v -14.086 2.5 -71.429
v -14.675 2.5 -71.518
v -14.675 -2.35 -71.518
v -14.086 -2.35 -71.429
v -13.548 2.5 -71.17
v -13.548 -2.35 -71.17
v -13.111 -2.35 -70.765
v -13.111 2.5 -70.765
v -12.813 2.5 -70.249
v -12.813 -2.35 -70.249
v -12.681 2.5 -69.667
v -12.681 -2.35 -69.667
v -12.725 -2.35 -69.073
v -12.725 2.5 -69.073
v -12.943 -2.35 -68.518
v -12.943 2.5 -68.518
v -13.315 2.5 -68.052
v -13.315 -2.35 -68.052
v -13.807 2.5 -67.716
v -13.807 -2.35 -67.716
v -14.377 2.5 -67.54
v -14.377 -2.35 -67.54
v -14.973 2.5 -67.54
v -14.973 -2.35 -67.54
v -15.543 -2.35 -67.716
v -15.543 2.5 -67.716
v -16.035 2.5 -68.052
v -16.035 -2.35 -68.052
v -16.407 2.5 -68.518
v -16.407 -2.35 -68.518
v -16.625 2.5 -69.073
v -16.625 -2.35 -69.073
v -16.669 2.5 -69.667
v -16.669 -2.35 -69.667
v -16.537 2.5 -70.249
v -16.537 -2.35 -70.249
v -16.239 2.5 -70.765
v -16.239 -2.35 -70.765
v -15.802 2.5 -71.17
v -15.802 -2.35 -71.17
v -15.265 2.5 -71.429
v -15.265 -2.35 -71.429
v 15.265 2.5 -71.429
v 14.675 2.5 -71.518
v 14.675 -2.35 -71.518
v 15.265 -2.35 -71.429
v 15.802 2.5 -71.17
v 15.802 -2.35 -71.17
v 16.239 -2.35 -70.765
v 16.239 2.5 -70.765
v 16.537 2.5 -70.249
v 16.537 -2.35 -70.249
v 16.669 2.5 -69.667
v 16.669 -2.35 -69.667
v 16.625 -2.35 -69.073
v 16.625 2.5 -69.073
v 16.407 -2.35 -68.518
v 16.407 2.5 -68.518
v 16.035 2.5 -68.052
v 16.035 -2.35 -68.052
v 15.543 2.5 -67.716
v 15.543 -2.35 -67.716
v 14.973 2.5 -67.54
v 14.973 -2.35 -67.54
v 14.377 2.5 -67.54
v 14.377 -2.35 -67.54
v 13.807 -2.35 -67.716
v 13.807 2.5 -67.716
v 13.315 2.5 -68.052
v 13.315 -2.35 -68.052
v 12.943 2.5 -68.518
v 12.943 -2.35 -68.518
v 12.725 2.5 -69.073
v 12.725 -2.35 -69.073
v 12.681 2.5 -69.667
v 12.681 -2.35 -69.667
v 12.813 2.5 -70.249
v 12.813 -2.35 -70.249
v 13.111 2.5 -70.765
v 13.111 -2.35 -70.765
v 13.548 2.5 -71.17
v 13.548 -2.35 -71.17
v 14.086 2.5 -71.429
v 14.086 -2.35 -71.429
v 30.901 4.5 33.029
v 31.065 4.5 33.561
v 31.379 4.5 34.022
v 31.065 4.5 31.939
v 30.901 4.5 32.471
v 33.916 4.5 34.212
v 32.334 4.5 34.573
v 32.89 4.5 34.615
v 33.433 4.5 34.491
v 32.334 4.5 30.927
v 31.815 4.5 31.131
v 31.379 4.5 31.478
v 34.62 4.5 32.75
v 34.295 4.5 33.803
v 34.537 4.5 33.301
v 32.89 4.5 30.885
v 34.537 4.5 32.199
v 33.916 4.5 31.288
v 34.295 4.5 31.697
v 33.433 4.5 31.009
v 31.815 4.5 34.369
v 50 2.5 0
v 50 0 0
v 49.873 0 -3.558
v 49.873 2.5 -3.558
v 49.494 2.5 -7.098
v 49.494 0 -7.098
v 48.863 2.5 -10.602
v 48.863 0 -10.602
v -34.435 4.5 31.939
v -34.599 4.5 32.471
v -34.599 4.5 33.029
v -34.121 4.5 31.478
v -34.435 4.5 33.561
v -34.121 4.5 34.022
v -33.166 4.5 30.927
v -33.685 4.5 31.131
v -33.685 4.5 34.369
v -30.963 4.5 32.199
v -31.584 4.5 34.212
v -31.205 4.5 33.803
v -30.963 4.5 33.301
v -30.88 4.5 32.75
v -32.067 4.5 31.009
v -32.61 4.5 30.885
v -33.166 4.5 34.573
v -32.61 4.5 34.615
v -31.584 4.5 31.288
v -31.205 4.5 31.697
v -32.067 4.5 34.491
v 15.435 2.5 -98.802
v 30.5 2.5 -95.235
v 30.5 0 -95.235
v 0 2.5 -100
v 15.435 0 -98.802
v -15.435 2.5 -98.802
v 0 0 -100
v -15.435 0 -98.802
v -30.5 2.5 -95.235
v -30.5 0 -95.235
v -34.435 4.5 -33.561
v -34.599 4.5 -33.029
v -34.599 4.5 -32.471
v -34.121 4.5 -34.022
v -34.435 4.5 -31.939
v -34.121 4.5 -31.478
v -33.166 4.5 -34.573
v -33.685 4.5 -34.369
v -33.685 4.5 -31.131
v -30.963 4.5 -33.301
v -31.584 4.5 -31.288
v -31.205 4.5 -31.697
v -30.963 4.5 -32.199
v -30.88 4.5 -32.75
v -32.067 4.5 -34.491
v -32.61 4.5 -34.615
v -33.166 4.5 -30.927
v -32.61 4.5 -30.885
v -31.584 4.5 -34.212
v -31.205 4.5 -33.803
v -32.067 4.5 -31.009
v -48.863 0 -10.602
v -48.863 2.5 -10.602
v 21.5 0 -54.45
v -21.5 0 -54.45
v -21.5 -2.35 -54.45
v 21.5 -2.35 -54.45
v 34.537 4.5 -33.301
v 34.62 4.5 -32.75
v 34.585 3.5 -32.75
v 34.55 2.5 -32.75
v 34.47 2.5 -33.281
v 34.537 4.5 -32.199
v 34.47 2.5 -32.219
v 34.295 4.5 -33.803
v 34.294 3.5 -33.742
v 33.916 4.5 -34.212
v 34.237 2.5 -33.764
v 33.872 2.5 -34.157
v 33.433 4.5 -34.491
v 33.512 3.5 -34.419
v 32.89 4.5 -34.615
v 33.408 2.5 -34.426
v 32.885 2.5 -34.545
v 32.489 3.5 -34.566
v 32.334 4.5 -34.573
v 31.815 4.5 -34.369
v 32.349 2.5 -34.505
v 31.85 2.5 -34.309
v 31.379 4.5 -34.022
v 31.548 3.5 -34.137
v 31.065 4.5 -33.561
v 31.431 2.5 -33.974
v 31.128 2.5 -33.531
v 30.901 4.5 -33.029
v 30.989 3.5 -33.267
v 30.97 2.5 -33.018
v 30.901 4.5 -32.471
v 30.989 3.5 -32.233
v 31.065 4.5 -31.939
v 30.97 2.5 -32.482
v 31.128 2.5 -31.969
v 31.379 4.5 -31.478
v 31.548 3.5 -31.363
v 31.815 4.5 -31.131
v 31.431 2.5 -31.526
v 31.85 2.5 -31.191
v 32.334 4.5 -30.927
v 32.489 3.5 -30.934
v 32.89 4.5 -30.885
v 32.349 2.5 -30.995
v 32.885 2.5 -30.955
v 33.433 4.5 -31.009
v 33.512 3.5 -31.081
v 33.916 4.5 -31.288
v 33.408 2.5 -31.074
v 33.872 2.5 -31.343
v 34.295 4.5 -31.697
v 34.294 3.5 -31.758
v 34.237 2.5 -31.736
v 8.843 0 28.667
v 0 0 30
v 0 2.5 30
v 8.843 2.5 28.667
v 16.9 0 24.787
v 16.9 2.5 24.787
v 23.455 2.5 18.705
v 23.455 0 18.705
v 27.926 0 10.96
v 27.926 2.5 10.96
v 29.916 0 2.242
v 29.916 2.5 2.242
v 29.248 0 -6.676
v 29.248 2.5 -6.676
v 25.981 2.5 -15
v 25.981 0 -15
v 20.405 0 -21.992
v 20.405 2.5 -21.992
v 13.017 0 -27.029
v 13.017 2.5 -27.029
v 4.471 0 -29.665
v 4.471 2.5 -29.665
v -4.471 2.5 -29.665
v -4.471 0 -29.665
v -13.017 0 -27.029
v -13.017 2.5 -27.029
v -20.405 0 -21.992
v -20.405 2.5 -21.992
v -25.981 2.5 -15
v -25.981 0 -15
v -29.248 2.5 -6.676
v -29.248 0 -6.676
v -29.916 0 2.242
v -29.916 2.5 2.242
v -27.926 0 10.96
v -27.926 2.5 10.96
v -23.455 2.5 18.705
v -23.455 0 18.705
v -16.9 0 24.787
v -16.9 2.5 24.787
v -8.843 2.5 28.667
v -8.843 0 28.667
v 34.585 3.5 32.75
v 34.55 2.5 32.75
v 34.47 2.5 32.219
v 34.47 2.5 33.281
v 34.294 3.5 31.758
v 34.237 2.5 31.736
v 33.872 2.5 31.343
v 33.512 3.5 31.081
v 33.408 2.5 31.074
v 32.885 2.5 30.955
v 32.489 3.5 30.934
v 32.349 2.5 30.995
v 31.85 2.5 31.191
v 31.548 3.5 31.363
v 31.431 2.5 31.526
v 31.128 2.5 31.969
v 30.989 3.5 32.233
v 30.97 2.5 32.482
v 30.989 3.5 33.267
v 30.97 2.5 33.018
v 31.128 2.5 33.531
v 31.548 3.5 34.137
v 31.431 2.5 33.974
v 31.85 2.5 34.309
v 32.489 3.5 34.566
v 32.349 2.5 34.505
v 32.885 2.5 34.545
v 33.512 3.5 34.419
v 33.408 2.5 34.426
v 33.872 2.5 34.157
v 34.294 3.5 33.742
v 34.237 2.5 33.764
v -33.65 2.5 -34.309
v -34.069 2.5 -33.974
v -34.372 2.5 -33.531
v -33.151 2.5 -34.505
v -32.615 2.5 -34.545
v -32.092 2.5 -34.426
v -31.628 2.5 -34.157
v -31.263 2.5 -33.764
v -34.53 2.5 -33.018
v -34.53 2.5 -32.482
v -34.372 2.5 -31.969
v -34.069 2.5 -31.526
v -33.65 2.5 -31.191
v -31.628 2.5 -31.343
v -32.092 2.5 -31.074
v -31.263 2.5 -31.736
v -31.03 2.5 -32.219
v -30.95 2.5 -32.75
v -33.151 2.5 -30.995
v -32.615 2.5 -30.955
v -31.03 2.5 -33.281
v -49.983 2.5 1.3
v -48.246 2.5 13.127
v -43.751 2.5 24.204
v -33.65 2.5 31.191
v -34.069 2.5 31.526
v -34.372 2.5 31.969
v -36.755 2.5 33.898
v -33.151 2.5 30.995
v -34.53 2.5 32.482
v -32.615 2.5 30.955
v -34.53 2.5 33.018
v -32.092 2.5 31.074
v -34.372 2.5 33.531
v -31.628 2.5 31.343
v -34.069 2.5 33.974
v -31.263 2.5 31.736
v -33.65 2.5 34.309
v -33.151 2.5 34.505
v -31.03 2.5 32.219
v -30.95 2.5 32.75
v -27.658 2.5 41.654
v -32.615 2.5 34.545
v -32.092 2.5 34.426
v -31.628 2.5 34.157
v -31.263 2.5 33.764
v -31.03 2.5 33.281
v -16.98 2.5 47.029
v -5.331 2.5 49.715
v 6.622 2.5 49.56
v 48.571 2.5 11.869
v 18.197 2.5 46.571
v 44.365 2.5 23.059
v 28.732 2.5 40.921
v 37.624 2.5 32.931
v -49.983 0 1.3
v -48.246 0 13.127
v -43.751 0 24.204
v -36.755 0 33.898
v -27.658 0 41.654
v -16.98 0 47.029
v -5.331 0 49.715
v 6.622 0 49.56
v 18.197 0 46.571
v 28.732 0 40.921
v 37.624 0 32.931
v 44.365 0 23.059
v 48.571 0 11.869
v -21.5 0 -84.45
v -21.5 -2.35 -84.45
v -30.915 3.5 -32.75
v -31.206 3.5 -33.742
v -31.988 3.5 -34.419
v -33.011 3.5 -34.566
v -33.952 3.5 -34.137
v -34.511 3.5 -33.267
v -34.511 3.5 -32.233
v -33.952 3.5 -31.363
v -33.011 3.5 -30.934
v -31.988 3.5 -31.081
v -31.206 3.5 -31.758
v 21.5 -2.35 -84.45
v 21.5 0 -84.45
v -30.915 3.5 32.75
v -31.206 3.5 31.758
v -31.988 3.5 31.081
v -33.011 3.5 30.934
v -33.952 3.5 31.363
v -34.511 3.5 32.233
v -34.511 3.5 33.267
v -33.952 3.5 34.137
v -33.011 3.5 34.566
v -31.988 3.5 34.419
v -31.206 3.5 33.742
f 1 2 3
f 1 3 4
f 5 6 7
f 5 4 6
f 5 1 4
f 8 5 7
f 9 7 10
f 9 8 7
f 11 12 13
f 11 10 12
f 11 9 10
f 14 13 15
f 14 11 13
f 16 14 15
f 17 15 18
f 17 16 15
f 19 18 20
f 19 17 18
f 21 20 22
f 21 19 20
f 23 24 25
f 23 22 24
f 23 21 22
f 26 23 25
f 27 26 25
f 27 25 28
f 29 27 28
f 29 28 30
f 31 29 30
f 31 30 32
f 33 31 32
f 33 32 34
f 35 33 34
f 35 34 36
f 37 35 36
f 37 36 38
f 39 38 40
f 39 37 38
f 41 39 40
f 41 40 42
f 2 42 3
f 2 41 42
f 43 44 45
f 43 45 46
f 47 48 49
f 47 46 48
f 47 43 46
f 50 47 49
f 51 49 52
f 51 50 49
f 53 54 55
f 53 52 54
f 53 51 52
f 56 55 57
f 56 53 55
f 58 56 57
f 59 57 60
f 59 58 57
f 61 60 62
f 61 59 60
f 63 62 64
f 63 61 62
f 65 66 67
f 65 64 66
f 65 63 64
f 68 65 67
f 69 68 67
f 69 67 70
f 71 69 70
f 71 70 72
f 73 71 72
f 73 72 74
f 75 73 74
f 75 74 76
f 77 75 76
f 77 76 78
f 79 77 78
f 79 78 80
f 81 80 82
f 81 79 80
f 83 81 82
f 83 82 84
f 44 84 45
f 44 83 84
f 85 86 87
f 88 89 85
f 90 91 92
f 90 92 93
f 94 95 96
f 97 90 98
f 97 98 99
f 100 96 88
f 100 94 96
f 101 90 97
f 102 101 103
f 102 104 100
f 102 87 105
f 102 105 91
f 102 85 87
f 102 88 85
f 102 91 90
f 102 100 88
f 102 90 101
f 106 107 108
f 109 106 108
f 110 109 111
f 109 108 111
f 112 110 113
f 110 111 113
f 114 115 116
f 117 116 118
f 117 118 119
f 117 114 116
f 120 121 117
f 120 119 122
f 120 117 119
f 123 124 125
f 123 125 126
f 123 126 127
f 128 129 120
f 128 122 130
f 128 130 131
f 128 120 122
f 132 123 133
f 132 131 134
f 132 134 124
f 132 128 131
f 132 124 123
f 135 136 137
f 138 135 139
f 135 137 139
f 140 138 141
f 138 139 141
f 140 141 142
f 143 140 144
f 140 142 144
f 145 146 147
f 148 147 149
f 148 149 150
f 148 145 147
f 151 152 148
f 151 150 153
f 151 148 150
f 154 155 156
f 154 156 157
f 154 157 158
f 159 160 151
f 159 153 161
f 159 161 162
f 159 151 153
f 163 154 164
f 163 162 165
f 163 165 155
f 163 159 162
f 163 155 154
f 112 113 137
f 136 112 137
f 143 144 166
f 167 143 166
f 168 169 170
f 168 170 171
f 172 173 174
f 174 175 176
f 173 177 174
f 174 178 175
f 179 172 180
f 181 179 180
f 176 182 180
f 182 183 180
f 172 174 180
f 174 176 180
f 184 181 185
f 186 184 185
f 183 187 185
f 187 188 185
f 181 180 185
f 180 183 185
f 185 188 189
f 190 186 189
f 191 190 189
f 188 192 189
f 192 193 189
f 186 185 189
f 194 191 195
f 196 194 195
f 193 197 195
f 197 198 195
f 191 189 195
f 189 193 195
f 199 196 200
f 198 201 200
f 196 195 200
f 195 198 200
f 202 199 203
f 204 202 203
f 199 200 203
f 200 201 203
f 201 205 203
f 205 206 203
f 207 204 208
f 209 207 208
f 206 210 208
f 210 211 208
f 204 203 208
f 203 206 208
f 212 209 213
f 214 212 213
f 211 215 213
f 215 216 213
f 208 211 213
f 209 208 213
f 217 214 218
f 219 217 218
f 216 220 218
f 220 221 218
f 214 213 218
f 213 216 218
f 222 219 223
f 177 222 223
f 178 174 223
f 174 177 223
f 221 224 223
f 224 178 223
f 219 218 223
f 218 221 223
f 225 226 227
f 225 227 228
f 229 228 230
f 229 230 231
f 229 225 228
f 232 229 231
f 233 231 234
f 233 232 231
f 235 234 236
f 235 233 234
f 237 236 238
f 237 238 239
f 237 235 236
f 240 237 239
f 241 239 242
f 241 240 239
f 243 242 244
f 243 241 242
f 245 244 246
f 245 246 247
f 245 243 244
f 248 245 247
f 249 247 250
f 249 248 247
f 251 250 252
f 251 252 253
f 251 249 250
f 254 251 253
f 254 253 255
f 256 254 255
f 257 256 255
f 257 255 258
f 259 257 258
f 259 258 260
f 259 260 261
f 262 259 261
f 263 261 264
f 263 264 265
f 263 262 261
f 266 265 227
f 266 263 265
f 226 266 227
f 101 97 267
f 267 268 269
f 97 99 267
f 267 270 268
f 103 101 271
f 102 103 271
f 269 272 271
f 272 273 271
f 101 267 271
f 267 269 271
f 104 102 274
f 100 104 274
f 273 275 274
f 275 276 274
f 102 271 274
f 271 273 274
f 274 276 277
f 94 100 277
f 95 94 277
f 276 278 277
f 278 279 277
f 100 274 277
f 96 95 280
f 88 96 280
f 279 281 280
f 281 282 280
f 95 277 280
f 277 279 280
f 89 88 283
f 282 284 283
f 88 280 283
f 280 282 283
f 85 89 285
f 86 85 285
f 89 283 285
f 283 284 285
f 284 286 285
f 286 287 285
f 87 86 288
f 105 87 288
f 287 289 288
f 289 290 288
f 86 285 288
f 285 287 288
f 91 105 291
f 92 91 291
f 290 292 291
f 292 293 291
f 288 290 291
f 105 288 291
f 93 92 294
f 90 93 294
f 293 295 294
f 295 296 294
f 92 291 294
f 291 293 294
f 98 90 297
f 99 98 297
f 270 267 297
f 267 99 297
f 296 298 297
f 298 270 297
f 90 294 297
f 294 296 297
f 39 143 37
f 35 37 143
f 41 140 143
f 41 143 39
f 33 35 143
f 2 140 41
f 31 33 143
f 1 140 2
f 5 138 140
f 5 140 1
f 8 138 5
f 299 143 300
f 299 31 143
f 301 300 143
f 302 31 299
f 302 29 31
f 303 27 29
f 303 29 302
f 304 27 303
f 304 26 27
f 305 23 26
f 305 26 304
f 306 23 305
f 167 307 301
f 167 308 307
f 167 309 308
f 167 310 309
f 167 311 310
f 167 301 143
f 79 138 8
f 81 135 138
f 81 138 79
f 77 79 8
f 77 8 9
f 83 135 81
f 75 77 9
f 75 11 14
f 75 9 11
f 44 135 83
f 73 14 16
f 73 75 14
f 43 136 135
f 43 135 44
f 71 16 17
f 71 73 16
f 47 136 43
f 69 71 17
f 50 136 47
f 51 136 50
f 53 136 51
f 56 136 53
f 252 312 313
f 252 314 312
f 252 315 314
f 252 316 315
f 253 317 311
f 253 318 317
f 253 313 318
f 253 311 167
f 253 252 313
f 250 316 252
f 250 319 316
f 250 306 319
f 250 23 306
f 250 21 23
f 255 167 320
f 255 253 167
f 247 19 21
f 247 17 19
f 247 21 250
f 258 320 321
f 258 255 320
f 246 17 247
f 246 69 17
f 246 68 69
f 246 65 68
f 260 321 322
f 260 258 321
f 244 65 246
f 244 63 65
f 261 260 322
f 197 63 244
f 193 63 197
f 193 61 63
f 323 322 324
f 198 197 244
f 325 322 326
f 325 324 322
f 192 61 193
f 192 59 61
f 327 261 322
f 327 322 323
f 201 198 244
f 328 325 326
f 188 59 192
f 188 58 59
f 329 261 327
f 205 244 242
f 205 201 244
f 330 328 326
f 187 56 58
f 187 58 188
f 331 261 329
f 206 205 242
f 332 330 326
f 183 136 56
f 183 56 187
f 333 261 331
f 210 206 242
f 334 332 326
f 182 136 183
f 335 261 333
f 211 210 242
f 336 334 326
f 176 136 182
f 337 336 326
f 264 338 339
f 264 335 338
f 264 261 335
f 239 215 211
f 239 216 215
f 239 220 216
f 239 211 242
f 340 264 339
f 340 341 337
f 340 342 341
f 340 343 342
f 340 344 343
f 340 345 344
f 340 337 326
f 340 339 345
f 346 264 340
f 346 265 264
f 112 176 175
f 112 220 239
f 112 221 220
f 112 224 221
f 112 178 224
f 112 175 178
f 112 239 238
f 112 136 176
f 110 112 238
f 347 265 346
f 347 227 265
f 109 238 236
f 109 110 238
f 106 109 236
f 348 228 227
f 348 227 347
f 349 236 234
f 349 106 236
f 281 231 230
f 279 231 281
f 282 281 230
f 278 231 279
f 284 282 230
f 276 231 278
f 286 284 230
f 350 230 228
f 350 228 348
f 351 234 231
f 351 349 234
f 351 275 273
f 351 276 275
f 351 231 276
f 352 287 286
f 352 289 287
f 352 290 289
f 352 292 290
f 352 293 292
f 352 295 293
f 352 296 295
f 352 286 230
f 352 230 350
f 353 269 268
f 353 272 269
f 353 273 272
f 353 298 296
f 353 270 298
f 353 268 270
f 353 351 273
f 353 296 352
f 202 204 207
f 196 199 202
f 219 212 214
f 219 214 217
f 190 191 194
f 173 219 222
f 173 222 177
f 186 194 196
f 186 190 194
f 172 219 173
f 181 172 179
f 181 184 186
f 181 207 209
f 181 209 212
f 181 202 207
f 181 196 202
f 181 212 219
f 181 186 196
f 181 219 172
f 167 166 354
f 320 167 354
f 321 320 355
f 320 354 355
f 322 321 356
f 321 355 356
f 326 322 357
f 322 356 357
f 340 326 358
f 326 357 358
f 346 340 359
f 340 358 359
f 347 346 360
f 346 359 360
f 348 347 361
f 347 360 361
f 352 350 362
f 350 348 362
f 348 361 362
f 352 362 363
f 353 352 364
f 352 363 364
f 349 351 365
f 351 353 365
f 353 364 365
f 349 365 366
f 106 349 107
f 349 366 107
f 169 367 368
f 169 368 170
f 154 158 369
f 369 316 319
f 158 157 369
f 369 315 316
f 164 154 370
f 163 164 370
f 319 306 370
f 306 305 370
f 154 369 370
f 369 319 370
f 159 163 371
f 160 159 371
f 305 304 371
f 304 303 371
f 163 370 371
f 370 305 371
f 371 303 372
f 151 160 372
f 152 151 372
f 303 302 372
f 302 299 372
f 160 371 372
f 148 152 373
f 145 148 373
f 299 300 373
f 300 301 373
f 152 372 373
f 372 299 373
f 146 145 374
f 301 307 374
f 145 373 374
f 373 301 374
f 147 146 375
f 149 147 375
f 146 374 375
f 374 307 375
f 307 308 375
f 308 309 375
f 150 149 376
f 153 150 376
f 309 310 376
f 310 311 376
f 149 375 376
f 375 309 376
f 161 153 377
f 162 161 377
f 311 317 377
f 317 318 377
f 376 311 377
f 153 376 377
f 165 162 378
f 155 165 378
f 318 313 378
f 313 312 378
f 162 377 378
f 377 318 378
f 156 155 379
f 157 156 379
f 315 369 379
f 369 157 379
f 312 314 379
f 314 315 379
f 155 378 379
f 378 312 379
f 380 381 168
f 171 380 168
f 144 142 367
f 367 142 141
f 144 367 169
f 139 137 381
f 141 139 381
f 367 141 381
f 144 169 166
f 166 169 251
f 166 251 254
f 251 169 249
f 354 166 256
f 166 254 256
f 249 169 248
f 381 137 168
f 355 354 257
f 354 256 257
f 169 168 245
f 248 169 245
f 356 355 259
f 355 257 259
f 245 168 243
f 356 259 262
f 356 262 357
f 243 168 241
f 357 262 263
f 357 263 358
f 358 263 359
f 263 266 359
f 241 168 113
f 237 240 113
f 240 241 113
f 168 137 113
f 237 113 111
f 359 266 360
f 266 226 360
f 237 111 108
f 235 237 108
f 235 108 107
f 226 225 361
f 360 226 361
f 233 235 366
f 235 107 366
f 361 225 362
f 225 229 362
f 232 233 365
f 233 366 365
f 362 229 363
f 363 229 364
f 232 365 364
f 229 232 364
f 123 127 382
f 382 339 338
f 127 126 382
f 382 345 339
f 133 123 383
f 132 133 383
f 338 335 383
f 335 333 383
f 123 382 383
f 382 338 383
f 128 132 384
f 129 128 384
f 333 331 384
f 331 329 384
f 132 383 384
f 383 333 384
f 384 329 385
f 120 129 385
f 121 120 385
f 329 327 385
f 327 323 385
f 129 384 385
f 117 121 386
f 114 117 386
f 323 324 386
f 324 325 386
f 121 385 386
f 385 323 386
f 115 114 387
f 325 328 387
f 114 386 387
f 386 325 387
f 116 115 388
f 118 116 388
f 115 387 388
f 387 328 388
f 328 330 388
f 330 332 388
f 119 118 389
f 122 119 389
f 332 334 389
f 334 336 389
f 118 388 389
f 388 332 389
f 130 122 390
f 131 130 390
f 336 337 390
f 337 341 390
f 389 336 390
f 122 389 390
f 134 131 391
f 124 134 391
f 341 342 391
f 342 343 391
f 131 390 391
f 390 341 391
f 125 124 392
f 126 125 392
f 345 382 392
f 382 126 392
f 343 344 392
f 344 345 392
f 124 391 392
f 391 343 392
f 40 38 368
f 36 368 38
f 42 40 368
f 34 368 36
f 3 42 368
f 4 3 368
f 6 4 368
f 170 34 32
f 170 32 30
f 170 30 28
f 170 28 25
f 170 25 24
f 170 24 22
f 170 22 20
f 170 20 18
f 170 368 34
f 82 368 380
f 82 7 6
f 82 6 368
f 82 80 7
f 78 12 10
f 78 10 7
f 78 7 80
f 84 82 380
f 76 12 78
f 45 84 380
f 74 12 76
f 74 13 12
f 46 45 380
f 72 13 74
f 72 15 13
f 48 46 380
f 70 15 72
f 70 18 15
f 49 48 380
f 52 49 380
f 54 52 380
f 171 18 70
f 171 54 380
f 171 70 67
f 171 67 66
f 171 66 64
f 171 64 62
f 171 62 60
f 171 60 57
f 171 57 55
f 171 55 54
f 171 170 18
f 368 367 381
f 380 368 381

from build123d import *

# Parameters (mm, degrees)
SKETCH1_R                     = 100
SKETCH1_R_2                   = 30
BOSS_EXTRUDE1_DEPTH           = 2.5
SKETCH2_R                     = 1.8
BOSS_EXTRUDE2_DEPTH           = 2
BOSS_EXTRUDE2_DRAFT           = -2
BOSS_EXTRUDE2_PROFILE_2_DEPTH = 2
BOSS_EXTRUDE2_PROFILE_2_DRAFT = -2
BOSS_EXTRUDE2_PROFILE_3_DEPTH = 2
BOSS_EXTRUDE2_PROFILE_3_DRAFT = -2
BOSS_EXTRUDE2_PROFILE_4_DEPTH = 2
BOSS_EXTRUDE2_PROFILE_4_DRAFT = -2
SKETCH5_W                     = 43
SKETCH5_H                     = 30
BOSS_EXTRUDE4_DEPTH           = 2.35
CUT_EXTRUDE1_DEPTH            = 142.492932686
CUT_EXTRUDE1_DEPTH_BACK       = 142.492932686
SKETCH4_R                     = 2
CUT_EXTRUDE2_DEPTH            = 142.492932686


with BuildPart() as part:
    # Sketch1 → Boss-Extrude1 (new body)
    with BuildSketch(Plane(origin=(0, 0, 0), x_dir=(1, 0, 0), z_dir=(0, 1, 0))):
        with Locations(Location((0, 0, 0), (0, 0, 270))):
            Circle(SKETCH1_R)
        with Locations(Location((0, 0, 0), (0, 0, 270))):
            Circle(SKETCH1_R_2, mode=Mode.SUBTRACT)
    extrude(amount=BOSS_EXTRUDE1_DEPTH)


with BuildPart() as boss_extrude2_tool:
    # Sketch2 → Boss-Extrude2 (with draft: the straight prism first)
    with BuildSketch(Plane(origin=(0, 2.5, 0), x_dir=(1, 0, 0), z_dir=(0, 1, 0))):
        with Locations((-32.75, 32.75)):
            Circle(SKETCH2_R)
    extrude(amount=BOSS_EXTRUDE2_DEPTH)
    # Boss-Extrude2: the draft: its side faces are tilted about the plane it starts from
    boss_extrude2_sides = [boss_extrude2_tool.faces().sort_by_distance(p)[0] for p in [
        (-34.55, 3.5, -32.75),
    ]]
    draft(boss_extrude2_sides, Plane(origin=(0, 2.5, 0), x_dir=(1, 0, 0), z_dir=(0, 1, 0)), BOSS_EXTRUDE2_DRAFT)


with BuildPart() as part_1:
    add(part.part)

    # Boss-Extrude2: add boss_extrude2_tool
    add(boss_extrude2_tool.part)


with BuildPart() as boss_extrude2_profile_2_tool:
    # Sketch2 → Boss-Extrude2 profile 2 (with draft: the straight prism first)
    with BuildSketch(Plane(origin=(0, 2.5, 0), x_dir=(1, 0, 0), z_dir=(0, 1, 0))):
        with Locations((-32.75, -32.75)):
            Circle(SKETCH2_R)
    extrude(amount=BOSS_EXTRUDE2_PROFILE_2_DEPTH)
    # Boss-Extrude2 profile 2: the draft: its side faces are tilted about the plane it starts from
    boss_extrude2_profile_2_sides = [boss_extrude2_profile_2_tool.faces().sort_by_distance(p)[0] for p in [
        (-34.55, 3.5, 32.75),
    ]]
    draft(boss_extrude2_profile_2_sides, Plane(origin=(0, 2.5, 0), x_dir=(1, 0, 0), z_dir=(0, 1, 0)), BOSS_EXTRUDE2_PROFILE_2_DRAFT)


with BuildPart() as part_2:
    add(part_1.part)

    # Boss-Extrude2 profile 2: add boss_extrude2_profile_2_tool
    add(boss_extrude2_profile_2_tool.part)


with BuildPart() as boss_extrude2_profile_3_tool:
    # Sketch2 → Boss-Extrude2 profile 3 (with draft: the straight prism first)
    with BuildSketch(Plane(origin=(0, 2.5, 0), x_dir=(1, 0, 0), z_dir=(0, 1, 0))):
        with Locations((32.75, -32.75)):
            Circle(SKETCH2_R)
    extrude(amount=BOSS_EXTRUDE2_PROFILE_3_DEPTH)
    # Boss-Extrude2 profile 3: the draft: its side faces are tilted about the plane it starts from
    boss_extrude2_profile_3_sides = [boss_extrude2_profile_3_tool.faces().sort_by_distance(p)[0] for p in [
        (30.95, 3.5, 32.75),
    ]]
    draft(boss_extrude2_profile_3_sides, Plane(origin=(0, 2.5, 0), x_dir=(1, 0, 0), z_dir=(0, 1, 0)), BOSS_EXTRUDE2_PROFILE_3_DRAFT)


with BuildPart() as part_3:
    add(part_2.part)

    # Boss-Extrude2 profile 3: add boss_extrude2_profile_3_tool
    add(boss_extrude2_profile_3_tool.part)


with BuildPart() as boss_extrude2_profile_4_tool:
    # Sketch2 → Boss-Extrude2 profile 4 (with draft: the straight prism first)
    with BuildSketch(Plane(origin=(0, 2.5, 0), x_dir=(1, 0, 0), z_dir=(0, 1, 0))):
        with Locations((32.75, 32.75)):
            Circle(SKETCH2_R)
    extrude(amount=BOSS_EXTRUDE2_PROFILE_4_DEPTH)
    # Boss-Extrude2 profile 4: the draft: its side faces are tilted about the plane it starts from
    boss_extrude2_profile_4_sides = [boss_extrude2_profile_4_tool.faces().sort_by_distance(p)[0] for p in [
        (30.95, 3.5, -32.75),
    ]]
    draft(boss_extrude2_profile_4_sides, Plane(origin=(0, 2.5, 0), x_dir=(1, 0, 0), z_dir=(0, 1, 0)), BOSS_EXTRUDE2_PROFILE_4_DRAFT)


with BuildPart() as part_4:
    add(part_3.part)

    # Boss-Extrude2 profile 4: add boss_extrude2_profile_4_tool
    add(boss_extrude2_profile_4_tool.part)

    # Sketch5 → Boss-Extrude4 (add)
    with BuildSketch(Plane.XZ):
        with Locations((0, -69.45)):
            Rectangle(SKETCH5_W, SKETCH5_H)
    extrude(amount=BOSS_EXTRUDE4_DEPTH)

    # Sketch4 → Cut-Extrude1 (cut, two sides: drawn at the far end of the back side and taken through both)
    with BuildSketch(Plane.XZ.offset(-CUT_EXTRUDE1_DEPTH_BACK)):
        with Locations(Location((-14.675074607, -69.517945059, 0), (0, 0, 270))):
            Circle(SKETCH4_R)
        with Locations(Location((14.675074607, -69.517945059, 0), (0, 0, 270))):
            Circle(SKETCH4_R)
    extrude(amount=CUT_EXTRUDE1_DEPTH + CUT_EXTRUDE1_DEPTH_BACK, mode=Mode.SUBTRACT)

    # Sketch6 → Cut-Extrude2 (cut, through all)
    with BuildSketch(Plane.XZ):
        with BuildLine():
            Line((48.863066456, -10.601921361), (30.5, -95.235235076))
            ThreePointArc((30.5, -95.235235076), (80.777472107, -58.949130613), (100, 0))
            ThreePointArc((100, 0), (-58.949130613, 80.777472107), (-30.5, -95.235235076))
            Line((-30.5, -95.235235076), (-48.863066456, -10.601921361))
            ThreePointArc((-48.863066456, -10.601921361), (-5.331354294, 49.714954102), (50, 0))
            ThreePointArc((50, 0), (49.714954102, -5.331354294), (48.863066456, -10.601921361))
        make_face()
    extrude(amount=-CUT_EXTRUDE2_DEPTH, mode=Mode.SUBTRACT)


solid = part_4.part
